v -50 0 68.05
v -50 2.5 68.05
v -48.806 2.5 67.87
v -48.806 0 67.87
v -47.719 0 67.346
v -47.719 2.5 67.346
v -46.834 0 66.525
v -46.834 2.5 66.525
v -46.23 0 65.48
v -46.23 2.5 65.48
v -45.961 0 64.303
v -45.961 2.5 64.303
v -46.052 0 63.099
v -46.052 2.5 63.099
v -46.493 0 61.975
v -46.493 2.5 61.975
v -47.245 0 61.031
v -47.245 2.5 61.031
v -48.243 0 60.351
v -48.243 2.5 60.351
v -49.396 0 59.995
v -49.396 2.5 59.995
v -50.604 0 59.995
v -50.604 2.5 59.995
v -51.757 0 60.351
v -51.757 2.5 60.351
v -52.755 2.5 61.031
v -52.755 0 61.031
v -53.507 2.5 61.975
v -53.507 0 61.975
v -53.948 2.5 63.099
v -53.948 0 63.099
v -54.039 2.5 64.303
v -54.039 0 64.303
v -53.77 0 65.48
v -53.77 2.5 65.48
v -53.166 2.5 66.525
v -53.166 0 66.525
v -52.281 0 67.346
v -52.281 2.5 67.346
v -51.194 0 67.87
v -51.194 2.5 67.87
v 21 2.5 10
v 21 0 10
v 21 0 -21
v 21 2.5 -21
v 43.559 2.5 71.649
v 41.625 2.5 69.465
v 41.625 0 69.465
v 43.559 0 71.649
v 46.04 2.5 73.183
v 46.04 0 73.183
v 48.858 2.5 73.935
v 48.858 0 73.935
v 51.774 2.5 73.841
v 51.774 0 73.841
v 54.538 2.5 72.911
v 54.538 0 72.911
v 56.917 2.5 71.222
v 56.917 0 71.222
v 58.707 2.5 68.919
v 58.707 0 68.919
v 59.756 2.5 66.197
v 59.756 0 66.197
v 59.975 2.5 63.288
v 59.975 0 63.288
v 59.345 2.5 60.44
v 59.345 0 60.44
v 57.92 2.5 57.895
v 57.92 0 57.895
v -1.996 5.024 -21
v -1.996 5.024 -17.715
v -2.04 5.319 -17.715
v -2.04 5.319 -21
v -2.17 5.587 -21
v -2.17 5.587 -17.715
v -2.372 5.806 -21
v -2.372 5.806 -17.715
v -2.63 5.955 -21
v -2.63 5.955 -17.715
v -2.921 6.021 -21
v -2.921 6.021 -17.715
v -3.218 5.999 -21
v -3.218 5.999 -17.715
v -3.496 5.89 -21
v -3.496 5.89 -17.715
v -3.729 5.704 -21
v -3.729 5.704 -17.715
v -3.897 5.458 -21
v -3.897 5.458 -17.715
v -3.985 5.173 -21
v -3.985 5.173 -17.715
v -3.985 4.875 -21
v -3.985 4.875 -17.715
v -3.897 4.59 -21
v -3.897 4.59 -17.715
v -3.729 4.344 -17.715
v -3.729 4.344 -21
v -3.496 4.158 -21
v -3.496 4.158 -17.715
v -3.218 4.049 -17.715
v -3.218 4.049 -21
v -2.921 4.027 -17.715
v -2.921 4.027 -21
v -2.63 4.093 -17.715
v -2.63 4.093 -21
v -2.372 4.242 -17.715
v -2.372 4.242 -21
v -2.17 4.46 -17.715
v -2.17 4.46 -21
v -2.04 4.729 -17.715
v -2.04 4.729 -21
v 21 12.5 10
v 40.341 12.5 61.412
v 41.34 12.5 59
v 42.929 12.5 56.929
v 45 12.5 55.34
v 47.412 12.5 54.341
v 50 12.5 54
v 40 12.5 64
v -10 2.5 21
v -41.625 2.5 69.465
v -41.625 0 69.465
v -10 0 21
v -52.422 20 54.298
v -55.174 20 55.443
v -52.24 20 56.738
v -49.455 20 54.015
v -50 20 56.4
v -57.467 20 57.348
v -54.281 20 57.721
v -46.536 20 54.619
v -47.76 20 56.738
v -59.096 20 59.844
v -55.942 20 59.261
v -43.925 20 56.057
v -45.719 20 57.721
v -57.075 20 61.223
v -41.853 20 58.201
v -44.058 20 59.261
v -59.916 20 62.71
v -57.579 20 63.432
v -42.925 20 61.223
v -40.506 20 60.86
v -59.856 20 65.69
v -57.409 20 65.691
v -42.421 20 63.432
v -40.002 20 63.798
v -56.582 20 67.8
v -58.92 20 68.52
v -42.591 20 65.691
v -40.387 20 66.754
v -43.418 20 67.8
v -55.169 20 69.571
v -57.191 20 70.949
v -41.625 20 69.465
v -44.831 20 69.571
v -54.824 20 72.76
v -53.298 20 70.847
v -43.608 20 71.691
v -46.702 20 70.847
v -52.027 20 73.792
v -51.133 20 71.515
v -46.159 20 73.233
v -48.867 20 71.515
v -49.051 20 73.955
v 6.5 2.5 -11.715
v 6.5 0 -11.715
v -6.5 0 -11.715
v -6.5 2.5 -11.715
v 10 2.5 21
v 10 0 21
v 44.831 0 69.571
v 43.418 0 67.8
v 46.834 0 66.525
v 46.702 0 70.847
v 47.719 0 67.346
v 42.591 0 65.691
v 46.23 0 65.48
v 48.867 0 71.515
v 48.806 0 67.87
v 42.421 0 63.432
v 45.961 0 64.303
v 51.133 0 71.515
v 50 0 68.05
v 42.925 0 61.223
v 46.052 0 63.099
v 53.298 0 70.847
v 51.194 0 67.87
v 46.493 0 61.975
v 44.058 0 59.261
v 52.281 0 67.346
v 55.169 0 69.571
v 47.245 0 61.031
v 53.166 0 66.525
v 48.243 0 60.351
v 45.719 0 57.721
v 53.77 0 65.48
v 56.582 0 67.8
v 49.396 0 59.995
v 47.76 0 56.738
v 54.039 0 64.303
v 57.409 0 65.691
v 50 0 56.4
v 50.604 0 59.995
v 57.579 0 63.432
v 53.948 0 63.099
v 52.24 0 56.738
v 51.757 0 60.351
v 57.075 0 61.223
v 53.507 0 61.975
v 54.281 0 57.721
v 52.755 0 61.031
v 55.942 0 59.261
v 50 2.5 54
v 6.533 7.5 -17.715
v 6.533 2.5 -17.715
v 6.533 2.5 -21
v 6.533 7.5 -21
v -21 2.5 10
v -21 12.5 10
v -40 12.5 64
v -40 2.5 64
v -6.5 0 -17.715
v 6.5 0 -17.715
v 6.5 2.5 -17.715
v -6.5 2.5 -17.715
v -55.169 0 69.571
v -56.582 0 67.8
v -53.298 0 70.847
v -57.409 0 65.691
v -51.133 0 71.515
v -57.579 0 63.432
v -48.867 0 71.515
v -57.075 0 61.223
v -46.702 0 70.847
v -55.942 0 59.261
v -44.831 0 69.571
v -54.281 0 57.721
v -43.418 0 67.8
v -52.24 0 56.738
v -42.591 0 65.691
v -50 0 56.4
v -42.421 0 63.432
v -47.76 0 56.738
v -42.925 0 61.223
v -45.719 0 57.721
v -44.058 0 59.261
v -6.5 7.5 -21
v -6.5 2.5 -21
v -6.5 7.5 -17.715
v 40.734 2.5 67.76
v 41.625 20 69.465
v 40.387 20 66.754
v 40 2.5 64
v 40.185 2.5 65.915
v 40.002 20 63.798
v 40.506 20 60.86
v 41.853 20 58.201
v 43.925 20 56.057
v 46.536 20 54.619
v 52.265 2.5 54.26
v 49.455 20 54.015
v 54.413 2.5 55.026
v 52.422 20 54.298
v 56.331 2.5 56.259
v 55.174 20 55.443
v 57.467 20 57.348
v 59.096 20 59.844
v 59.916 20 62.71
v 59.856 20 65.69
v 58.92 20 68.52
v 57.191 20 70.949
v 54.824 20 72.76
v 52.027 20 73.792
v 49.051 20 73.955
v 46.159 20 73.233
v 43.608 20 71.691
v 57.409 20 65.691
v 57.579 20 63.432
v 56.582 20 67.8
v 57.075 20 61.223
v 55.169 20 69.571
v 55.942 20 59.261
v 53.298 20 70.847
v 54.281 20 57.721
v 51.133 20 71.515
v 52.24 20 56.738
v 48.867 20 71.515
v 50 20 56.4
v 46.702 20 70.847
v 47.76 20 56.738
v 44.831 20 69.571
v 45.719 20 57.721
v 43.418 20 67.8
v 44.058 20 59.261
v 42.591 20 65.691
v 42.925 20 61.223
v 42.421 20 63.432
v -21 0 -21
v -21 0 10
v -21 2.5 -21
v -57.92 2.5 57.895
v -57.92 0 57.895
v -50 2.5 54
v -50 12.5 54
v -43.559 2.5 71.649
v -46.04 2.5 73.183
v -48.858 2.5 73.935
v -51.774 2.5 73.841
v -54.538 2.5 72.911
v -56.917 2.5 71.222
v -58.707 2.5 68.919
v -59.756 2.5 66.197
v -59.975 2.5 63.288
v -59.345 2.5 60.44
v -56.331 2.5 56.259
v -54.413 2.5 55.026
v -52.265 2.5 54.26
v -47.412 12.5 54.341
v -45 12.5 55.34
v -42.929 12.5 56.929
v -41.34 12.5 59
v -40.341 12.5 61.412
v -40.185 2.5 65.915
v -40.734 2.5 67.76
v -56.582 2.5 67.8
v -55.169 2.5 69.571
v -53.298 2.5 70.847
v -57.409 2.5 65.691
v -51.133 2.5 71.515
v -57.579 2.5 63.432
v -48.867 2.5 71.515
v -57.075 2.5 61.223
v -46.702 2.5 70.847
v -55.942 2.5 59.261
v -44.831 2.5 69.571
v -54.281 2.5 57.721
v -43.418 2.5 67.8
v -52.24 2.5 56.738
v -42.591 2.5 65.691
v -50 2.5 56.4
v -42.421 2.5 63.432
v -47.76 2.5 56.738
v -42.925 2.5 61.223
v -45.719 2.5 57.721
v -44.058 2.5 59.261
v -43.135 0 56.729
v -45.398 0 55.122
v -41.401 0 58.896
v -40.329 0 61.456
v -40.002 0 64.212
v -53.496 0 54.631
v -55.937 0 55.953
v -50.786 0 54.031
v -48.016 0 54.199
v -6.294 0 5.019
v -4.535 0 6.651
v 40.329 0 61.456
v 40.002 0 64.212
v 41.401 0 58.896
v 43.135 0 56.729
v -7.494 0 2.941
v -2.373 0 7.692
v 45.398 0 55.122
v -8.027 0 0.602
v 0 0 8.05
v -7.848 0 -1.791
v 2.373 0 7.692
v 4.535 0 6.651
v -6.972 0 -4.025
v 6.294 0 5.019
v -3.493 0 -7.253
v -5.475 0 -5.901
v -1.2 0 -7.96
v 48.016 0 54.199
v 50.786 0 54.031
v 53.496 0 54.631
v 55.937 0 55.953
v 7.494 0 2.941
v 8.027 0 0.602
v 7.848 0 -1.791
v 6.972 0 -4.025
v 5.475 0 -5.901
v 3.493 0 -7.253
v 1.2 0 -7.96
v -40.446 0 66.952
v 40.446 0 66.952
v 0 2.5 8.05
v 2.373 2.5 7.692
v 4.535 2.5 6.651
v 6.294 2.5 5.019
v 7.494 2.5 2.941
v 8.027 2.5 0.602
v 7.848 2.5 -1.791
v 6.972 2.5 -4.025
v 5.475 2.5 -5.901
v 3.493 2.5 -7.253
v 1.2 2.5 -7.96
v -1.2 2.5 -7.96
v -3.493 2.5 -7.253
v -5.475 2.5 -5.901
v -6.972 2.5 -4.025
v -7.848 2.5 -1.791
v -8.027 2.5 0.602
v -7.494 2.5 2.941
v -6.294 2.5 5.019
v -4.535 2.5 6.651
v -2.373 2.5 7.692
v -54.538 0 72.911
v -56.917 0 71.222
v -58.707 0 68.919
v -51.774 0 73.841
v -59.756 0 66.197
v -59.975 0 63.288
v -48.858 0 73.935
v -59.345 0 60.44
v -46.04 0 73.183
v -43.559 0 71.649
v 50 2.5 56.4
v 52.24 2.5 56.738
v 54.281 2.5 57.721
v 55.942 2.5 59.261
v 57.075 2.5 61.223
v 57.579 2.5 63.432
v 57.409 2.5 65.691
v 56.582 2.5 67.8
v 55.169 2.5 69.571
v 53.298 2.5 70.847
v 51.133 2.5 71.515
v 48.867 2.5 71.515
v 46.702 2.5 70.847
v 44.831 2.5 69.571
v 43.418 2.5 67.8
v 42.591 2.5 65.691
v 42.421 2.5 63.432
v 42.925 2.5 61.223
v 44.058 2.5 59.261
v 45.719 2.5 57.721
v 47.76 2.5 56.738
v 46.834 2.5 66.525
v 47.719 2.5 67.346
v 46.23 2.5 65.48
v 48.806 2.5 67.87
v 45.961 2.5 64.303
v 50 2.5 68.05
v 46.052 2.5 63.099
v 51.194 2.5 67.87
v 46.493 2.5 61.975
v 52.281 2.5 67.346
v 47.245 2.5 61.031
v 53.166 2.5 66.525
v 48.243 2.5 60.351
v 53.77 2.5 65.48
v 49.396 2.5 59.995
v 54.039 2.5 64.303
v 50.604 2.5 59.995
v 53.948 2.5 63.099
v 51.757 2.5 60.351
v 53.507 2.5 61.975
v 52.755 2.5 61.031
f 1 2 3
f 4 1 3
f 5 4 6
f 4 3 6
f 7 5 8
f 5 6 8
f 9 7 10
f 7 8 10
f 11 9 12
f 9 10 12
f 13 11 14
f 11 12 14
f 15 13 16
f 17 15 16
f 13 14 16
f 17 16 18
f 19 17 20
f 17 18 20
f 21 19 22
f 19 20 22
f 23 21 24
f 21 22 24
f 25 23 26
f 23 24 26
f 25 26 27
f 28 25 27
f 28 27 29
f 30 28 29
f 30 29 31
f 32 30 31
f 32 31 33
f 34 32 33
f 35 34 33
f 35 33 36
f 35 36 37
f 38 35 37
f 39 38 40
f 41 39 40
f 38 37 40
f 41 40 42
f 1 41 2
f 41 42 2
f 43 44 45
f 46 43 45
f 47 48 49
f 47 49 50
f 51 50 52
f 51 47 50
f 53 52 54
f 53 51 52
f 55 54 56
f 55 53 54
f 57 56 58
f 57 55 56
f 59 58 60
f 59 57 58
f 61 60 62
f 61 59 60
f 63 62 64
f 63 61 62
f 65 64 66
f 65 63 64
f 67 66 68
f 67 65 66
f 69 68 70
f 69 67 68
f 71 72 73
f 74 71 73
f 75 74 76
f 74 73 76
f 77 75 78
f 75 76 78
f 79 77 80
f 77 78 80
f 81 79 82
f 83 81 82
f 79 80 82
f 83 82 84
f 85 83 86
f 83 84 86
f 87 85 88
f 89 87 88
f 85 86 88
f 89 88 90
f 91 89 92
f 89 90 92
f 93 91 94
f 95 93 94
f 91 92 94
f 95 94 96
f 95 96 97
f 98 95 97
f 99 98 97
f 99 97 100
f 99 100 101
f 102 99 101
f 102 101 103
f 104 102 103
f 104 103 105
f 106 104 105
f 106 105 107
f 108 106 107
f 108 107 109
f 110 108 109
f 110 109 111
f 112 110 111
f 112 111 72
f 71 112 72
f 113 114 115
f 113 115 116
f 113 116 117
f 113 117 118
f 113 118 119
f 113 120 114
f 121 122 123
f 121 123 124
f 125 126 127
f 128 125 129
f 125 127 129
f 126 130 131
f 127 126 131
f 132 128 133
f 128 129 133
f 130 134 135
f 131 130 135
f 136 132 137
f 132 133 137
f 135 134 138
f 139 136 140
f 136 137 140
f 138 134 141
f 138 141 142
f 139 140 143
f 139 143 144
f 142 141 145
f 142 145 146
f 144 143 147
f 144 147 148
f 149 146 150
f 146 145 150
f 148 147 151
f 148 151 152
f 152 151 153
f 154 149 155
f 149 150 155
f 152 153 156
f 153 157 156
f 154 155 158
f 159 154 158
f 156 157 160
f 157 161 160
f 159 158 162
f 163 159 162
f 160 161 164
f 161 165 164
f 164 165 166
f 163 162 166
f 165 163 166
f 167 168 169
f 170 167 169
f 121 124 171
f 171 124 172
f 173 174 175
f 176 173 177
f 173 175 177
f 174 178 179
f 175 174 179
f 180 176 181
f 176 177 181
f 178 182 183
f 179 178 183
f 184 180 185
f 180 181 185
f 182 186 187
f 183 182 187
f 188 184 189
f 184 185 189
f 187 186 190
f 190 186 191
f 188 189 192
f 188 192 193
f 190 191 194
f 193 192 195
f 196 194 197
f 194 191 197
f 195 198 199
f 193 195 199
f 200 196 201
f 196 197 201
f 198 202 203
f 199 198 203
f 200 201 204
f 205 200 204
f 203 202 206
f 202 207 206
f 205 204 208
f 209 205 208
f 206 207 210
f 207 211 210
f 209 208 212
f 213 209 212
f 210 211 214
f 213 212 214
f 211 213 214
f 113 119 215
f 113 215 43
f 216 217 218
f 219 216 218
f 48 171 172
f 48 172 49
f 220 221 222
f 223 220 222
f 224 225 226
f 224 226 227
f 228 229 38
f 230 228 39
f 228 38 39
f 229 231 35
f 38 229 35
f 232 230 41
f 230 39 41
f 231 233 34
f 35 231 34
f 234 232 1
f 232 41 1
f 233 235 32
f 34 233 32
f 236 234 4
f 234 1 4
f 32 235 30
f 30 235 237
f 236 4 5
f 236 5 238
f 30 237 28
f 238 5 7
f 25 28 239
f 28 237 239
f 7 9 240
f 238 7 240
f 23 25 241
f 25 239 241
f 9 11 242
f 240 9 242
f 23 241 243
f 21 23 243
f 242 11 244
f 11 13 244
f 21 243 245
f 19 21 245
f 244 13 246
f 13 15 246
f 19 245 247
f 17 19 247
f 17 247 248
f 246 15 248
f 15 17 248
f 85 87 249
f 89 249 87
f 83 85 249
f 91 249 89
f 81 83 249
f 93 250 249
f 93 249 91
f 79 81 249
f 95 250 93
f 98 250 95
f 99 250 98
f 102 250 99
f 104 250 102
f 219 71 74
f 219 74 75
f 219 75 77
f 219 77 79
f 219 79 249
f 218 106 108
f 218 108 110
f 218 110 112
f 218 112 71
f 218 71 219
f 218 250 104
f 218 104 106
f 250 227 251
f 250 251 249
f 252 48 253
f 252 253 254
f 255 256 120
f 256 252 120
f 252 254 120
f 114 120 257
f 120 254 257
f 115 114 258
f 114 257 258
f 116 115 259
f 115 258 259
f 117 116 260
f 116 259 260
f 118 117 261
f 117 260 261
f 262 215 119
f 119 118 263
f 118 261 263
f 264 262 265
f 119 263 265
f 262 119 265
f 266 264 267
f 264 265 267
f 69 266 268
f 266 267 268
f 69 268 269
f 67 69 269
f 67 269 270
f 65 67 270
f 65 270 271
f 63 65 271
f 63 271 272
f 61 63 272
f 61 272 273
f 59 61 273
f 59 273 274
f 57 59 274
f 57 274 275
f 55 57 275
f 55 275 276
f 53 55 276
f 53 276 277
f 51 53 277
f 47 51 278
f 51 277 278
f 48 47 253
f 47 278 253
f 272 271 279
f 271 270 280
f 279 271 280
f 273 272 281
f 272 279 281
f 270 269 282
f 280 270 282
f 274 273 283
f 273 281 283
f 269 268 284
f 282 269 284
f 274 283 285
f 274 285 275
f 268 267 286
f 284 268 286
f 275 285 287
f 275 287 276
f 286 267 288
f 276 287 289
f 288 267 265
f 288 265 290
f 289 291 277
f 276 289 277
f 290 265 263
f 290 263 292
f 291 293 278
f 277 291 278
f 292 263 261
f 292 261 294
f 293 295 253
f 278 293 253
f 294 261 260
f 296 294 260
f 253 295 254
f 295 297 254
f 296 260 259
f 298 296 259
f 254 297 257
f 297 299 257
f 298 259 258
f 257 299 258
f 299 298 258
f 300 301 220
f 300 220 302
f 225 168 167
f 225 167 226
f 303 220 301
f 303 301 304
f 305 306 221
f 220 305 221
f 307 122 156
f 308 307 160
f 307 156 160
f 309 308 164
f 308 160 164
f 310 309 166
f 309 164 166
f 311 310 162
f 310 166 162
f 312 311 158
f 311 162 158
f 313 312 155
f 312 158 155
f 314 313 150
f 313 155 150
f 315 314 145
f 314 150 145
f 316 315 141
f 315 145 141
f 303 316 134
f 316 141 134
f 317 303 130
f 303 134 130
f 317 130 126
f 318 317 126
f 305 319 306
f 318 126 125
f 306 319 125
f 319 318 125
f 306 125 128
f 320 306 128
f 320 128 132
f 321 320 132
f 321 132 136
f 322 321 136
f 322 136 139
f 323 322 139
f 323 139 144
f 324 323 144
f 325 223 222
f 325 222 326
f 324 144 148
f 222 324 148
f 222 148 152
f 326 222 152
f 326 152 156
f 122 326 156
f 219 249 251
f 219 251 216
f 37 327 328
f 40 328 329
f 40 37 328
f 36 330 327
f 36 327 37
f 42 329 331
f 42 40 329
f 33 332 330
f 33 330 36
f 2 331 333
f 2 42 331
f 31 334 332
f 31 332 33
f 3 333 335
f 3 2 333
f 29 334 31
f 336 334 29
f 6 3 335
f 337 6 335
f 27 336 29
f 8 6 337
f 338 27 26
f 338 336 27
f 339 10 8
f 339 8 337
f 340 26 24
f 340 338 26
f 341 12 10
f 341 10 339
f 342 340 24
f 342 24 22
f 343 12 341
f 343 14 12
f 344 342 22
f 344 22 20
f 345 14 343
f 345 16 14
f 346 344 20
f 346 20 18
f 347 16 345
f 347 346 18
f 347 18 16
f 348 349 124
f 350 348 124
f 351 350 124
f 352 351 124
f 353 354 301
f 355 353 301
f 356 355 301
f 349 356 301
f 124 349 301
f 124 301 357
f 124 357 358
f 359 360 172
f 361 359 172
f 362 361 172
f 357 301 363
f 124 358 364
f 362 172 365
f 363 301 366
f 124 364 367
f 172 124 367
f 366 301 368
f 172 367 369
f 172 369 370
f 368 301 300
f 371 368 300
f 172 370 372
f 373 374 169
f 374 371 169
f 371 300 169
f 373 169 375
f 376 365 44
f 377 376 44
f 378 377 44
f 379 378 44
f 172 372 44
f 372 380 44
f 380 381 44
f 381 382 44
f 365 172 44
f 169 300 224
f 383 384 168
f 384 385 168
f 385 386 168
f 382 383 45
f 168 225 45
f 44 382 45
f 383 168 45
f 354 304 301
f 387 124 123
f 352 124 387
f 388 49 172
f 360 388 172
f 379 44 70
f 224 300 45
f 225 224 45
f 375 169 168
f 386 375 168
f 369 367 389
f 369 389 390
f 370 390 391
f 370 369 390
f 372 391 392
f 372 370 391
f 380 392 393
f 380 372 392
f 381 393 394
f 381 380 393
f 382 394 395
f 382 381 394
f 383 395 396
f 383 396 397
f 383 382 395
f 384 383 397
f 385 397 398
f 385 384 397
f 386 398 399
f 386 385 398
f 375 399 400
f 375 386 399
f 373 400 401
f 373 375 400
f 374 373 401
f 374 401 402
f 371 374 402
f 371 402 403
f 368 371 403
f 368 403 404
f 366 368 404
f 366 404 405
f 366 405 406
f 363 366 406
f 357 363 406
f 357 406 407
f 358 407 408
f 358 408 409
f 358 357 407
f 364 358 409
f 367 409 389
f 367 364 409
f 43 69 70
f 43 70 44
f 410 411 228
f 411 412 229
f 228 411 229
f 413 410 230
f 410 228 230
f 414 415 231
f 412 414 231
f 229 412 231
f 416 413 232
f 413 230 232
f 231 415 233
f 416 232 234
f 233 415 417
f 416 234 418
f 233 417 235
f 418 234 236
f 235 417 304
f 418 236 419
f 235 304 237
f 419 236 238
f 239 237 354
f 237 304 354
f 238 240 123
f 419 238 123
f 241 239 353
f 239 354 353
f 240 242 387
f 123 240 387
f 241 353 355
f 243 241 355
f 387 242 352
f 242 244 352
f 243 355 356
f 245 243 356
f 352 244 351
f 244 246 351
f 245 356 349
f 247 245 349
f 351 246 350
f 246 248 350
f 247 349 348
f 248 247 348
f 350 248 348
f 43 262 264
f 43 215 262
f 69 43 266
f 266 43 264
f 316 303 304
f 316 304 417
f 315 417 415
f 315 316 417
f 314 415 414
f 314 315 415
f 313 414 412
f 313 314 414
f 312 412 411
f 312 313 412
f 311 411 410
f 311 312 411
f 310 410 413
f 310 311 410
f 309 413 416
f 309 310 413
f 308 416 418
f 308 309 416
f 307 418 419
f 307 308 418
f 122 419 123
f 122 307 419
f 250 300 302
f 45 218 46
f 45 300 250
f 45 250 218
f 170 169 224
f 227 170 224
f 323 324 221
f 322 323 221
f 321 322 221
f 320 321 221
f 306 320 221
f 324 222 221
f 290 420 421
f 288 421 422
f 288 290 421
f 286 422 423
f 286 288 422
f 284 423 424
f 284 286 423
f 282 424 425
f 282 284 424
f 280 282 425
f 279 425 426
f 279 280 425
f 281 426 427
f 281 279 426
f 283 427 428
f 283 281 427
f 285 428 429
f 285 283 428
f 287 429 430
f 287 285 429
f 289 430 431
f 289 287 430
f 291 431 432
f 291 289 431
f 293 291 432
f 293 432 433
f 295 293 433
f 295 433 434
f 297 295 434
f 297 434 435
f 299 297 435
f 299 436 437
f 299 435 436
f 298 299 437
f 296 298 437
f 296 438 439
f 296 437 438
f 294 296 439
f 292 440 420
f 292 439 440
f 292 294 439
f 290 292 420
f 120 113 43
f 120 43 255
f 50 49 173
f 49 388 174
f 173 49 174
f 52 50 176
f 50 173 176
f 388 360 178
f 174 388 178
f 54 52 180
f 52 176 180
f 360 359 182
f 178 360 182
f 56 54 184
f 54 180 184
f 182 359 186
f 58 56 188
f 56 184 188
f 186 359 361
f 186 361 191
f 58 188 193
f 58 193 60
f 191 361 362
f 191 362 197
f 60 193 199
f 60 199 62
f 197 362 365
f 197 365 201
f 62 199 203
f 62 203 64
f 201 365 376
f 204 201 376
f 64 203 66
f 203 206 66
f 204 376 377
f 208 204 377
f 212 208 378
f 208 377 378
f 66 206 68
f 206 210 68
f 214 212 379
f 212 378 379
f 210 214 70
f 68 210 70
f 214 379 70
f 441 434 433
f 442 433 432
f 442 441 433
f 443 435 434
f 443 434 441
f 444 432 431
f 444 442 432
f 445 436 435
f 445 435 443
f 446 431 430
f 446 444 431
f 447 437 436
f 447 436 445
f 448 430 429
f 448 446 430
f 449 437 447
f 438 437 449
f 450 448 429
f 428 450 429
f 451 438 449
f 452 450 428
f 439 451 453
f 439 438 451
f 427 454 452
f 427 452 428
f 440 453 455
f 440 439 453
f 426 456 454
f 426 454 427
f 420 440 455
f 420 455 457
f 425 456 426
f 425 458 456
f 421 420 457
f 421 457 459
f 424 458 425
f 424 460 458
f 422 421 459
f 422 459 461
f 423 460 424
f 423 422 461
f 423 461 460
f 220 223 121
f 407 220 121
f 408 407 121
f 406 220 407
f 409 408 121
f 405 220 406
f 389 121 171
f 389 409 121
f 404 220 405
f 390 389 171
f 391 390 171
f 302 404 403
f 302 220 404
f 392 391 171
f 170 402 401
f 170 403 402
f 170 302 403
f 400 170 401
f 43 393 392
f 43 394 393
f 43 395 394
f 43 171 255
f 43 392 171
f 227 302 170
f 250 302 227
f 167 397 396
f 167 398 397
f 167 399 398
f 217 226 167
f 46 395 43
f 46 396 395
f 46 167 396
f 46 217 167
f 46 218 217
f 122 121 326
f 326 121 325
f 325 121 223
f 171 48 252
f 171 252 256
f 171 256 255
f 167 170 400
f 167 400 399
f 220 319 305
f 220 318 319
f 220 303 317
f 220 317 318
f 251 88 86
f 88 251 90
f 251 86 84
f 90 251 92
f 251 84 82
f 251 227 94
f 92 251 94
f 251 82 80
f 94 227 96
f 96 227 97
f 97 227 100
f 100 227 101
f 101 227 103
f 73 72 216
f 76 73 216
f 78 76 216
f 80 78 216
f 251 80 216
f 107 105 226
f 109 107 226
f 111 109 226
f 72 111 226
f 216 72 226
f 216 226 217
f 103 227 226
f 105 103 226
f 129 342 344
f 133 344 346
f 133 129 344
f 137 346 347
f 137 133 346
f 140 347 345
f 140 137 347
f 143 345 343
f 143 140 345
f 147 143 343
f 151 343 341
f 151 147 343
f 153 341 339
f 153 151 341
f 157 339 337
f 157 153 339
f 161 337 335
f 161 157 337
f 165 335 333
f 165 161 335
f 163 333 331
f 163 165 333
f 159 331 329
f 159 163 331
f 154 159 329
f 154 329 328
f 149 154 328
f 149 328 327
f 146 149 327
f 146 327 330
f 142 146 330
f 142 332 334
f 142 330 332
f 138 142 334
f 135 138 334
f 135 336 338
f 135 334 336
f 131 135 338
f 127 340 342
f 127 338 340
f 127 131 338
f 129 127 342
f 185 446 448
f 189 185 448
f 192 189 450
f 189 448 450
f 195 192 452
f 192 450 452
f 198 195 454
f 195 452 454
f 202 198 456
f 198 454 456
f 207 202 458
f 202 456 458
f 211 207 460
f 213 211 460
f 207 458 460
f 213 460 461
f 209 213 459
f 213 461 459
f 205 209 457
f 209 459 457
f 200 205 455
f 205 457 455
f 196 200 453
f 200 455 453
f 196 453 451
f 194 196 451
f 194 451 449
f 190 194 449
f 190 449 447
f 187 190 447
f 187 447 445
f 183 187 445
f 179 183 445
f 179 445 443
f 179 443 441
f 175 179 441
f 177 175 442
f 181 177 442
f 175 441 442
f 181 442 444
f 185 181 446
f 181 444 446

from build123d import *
from build123d.topology import SkipClean

# Parameters (mm, degrees)
SKETCH_6_W          = 42
SKETCH_6_H          = 42
SKETCH_6_R          = 8.05
EXTRUDE_1_DEPTH     = 2.5
SKETCH_7_R          = 4.05
EXTRUDE_5_DEPTH     = 2.5
EXTRUDE_START       = -20
SKETCH_9_R          = 10
SKETCH_9_R_2        = 7.6
EXTRUDE_7_DEPTH     = 20
EXTRUDE_START_2     = 10
EXTRUDE_8_DEPTH     = 10
SKETCH_11_W         = 13
SKETCH_11_H         = 6
CUT_EXTRUDE_1_DEPTH = 10
SKETCH_12_W         = 13.033140157
SKETCH_12_H         = 3.285057939
EXTRUDE_9_DEPTH     = 5
SKETCH_13_R         = 1
CUT_EXTRUDE_2_DEPTH = 10


with BuildPart() as part:
    # 草图6 → 凸台-拉伸1 (new body)
    with BuildSketch(Plane(origin=(0, 0, 0), x_dir=(1, 0, 0), z_dir=(0, 1, 0))):
        Rectangle(SKETCH_6_W, SKETCH_6_H)
        with Locations(Location((0, 0, 0), (0, 0, 270))):
            Circle(SKETCH_6_R, mode=Mode.SUBTRACT)
    extrude(amount=EXTRUDE_1_DEPTH)

    # 草图7 → 凸台-拉伸5 (add)
    # profile 1 of 2: a face of its own
    with BuildSketch(Plane(origin=(0, 2.5, 0), x_dir=(1, 0, 0), z_dir=(0, 1, 0))):
        with BuildLine():
            Line((-21, -21), (-21, -10))
            Line((-21, -10), (-57.920014013, -57.894807289))
            ThreePointArc((-57.920014013, -57.894807289), (-55.789479543, -72.15364499), (-41.625301702, -69.464835626))
            Line((-41.625301702, -69.464835626), (-10, -21))
            Line((-10, -21), (-21, -21))
        make_face()
        with Locations(Location((-50, -64, 0), (0, 0, 270))):
            Circle(SKETCH_7_R, mode=Mode.SUBTRACT)
    # profile 2 of 2: a face of its own
    with BuildSketch(Plane(origin=(0, 2.5, 0), x_dir=(1, 0, 0), z_dir=(0, 1, 0))):
        with BuildLine():
            Line((57.920014013, -57.894807289), (21, -10))
            Line((21, -10), (21, -21))
            Line((21, -21), (10, -21))
            Line((10, -21), (41.625301702, -69.464835626))
            ThreePointArc((41.625301702, -69.464835626), (55.789479543, -72.15364499), (57.920014013, -57.894807289))
        make_face()
        with Locations(Location((50, -64, 0), (0, 0, 270))):
            Circle(SKETCH_7_R, mode=Mode.SUBTRACT)
    extrude(amount=-EXTRUDE_5_DEPTH)

    # 草图9 → 凸台-拉伸7 (add)
    # profile 1 of 2: a face of its own
    with SkipClean():  # the faces are left unmerged after this step: merging them gives an invalid solid
        with BuildSketch(Plane(origin=(0, 0, 0), x_dir=(-1, 0, 0), z_dir=(0, -1, 0)).offset(EXTRUDE_START)):
            with Locations(Location((50, -64, 0), (0, 0, 213.126103521))):
                Circle(SKETCH_9_R)
            with Locations(Location((50, -64, 0), (0, 0, 90))):
                Circle(SKETCH_9_R_2, mode=Mode.SUBTRACT)
        # profile 2 of 2: a face of its own
        with BuildSketch(Plane(origin=(0, 0, 0), x_dir=(-1, 0, 0), z_dir=(0, -1, 0)).offset(EXTRUDE_START)):
            with Locations(Location((-50, -64, 0), (0, 0, 326.873896479))):
                Circle(SKETCH_9_R)
            with Locations(Location((-50, -64, 0), (0, 0, 90))):
                Circle(SKETCH_9_R_2, mode=Mode.SUBTRACT)
        extrude(amount=EXTRUDE_7_DEPTH)

    # 草图10 → 凸台-拉伸8 (add)
    with SkipClean():  # the faces are left unmerged after this step: merging them gives an invalid solid
        with BuildSketch(Plane(origin=(0, 2.5, 0), x_dir=(1, 0, 0), z_dir=(0, 1, 0)).offset(EXTRUDE_START_2)):
            with BuildLine():
                Line((-50, -54), (-21, -10))
                Line((-21, -10), (-40, -64))
                ThreePointArc((-40, -64), (-42.928932188, -56.928932188), (-50, -54))
            make_face()
            with BuildLine():
                Line((21, -10), (40, -64))
                ThreePointArc((40, -64), (42.928932188, -56.928932188), (50, -54))
                Line((50, -54), (21, -10))
            make_face()
        extrude(amount=-EXTRUDE_8_DEPTH)

    # 草图11 → 切除-拉伸1 (cut)
    with SkipClean():  # the faces are left unmerged after this step: merging them gives an invalid solid
        with BuildSketch(Plane(origin=(0, 0, 0), x_dir=(-1, 0, 0), z_dir=(0, -1, 0))):
            with Locations((0, 14.714942061)):
                Rectangle(SKETCH_11_W, SKETCH_11_H)
        extrude(amount=-CUT_EXTRUDE_1_DEPTH, mode=Mode.SUBTRACT)

    # 草图12 → 凸台-拉伸9 (add)
    with SkipClean():  # the faces are left unmerged after this step: merging them gives an invalid solid
        with BuildSketch(Plane(origin=(0, 2.5, 0), x_dir=(1, 0, 0), z_dir=(0, 1, 0))):
            with Locations((0.016570079, 19.357471031)):
                Rectangle(SKETCH_12_W, SKETCH_12_H)
        extrude(amount=EXTRUDE_9_DEPTH)

    # 草图13 → 切除-拉伸2 (cut)
    with SkipClean():  # the faces are left unmerged after this step: merging them gives an invalid solid
        with BuildSketch(Plane.XY.offset(-17.714942061)):
            with Locations((-2.99582225, 5.023747012)):
                Circle(SKETCH_13_R)
        extrude(amount=-CUT_EXTRUDE_2_DEPTH, mode=Mode.SUBTRACT)


solid = part.part
